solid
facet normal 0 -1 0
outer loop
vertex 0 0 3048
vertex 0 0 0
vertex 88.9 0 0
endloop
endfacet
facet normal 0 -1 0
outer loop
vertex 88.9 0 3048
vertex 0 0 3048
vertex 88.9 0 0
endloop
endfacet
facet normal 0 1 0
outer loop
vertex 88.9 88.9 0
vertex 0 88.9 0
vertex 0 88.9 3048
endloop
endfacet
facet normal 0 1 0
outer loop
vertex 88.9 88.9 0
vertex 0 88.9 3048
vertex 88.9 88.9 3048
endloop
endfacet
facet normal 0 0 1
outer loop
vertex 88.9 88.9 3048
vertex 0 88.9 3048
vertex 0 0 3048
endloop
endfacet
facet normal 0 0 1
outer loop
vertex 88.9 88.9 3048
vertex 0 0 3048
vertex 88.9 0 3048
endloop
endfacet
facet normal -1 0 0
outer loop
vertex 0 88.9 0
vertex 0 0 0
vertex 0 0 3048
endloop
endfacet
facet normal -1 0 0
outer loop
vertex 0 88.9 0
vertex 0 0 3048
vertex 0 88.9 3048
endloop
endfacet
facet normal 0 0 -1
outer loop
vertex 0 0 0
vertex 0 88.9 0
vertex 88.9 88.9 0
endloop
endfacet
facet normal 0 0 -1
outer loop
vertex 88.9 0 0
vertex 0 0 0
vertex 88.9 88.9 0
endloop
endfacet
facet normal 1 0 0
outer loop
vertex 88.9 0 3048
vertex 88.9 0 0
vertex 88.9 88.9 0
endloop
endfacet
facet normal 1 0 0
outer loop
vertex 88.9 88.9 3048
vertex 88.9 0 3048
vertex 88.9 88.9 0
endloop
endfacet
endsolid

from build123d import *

# Parameters (mm, degrees)
F0_W     = 88.9
F0_H     = 88.9
F1_DEPTH = 3048
F2_W     = 38.1
F2_H     = 184.15
F3_DEPTH = 2362.2
F4_W     = 38.1
F4_H     = 184.15
F5_DEPTH = 1200.15
F6_W     = 38.1
F6_H     = 88.9
F7_DEPTH = 1123.95
F8_W     = 38.1
F8_H     = 88.9
F9_DEPTH = 1320.8


with BuildPart() as f1:
    # F0 (on Top) → F1 (new body)
    with BuildSketch(Plane.XY):
        with Locations((44.45, 44.45)):
            Rectangle(F0_W, F0_H)
    extrude(amount=F1_DEPTH)


with BuildPart() as f3:
    # F2 (on Front) → F3 (new body)
    with BuildSketch(Plane.XZ):
        with Locations((-146.594351, 92.075)):
            Rectangle(F2_W, F2_H)
    extrude(amount=F3_DEPTH)


with BuildPart() as f5:
    # F4 (on Right) → F5 (new body)
    with BuildSketch(Plane.YZ):
        with Locations((249.086387, 92.075)):
            Rectangle(F4_W, F4_H)
    extrude(amount=F5_DEPTH)


with BuildPart() as f7:
    # F6 (on Front) → F7 (new body)
    with BuildSketch(Plane.XZ):
        with Locations((-334.724839, 44.45)):
            Rectangle(F6_W, F6_H)
    extrude(amount=F7_DEPTH)


with BuildPart() as f9:
    # F8 (on Top) → F9 (new body)
    with BuildSketch(Plane.XY):
        with Locations((54.404456, -162.528336)):
            Rectangle(F8_W, F8_H)
    extrude(amount=F9_DEPTH)


solid = f1.part
